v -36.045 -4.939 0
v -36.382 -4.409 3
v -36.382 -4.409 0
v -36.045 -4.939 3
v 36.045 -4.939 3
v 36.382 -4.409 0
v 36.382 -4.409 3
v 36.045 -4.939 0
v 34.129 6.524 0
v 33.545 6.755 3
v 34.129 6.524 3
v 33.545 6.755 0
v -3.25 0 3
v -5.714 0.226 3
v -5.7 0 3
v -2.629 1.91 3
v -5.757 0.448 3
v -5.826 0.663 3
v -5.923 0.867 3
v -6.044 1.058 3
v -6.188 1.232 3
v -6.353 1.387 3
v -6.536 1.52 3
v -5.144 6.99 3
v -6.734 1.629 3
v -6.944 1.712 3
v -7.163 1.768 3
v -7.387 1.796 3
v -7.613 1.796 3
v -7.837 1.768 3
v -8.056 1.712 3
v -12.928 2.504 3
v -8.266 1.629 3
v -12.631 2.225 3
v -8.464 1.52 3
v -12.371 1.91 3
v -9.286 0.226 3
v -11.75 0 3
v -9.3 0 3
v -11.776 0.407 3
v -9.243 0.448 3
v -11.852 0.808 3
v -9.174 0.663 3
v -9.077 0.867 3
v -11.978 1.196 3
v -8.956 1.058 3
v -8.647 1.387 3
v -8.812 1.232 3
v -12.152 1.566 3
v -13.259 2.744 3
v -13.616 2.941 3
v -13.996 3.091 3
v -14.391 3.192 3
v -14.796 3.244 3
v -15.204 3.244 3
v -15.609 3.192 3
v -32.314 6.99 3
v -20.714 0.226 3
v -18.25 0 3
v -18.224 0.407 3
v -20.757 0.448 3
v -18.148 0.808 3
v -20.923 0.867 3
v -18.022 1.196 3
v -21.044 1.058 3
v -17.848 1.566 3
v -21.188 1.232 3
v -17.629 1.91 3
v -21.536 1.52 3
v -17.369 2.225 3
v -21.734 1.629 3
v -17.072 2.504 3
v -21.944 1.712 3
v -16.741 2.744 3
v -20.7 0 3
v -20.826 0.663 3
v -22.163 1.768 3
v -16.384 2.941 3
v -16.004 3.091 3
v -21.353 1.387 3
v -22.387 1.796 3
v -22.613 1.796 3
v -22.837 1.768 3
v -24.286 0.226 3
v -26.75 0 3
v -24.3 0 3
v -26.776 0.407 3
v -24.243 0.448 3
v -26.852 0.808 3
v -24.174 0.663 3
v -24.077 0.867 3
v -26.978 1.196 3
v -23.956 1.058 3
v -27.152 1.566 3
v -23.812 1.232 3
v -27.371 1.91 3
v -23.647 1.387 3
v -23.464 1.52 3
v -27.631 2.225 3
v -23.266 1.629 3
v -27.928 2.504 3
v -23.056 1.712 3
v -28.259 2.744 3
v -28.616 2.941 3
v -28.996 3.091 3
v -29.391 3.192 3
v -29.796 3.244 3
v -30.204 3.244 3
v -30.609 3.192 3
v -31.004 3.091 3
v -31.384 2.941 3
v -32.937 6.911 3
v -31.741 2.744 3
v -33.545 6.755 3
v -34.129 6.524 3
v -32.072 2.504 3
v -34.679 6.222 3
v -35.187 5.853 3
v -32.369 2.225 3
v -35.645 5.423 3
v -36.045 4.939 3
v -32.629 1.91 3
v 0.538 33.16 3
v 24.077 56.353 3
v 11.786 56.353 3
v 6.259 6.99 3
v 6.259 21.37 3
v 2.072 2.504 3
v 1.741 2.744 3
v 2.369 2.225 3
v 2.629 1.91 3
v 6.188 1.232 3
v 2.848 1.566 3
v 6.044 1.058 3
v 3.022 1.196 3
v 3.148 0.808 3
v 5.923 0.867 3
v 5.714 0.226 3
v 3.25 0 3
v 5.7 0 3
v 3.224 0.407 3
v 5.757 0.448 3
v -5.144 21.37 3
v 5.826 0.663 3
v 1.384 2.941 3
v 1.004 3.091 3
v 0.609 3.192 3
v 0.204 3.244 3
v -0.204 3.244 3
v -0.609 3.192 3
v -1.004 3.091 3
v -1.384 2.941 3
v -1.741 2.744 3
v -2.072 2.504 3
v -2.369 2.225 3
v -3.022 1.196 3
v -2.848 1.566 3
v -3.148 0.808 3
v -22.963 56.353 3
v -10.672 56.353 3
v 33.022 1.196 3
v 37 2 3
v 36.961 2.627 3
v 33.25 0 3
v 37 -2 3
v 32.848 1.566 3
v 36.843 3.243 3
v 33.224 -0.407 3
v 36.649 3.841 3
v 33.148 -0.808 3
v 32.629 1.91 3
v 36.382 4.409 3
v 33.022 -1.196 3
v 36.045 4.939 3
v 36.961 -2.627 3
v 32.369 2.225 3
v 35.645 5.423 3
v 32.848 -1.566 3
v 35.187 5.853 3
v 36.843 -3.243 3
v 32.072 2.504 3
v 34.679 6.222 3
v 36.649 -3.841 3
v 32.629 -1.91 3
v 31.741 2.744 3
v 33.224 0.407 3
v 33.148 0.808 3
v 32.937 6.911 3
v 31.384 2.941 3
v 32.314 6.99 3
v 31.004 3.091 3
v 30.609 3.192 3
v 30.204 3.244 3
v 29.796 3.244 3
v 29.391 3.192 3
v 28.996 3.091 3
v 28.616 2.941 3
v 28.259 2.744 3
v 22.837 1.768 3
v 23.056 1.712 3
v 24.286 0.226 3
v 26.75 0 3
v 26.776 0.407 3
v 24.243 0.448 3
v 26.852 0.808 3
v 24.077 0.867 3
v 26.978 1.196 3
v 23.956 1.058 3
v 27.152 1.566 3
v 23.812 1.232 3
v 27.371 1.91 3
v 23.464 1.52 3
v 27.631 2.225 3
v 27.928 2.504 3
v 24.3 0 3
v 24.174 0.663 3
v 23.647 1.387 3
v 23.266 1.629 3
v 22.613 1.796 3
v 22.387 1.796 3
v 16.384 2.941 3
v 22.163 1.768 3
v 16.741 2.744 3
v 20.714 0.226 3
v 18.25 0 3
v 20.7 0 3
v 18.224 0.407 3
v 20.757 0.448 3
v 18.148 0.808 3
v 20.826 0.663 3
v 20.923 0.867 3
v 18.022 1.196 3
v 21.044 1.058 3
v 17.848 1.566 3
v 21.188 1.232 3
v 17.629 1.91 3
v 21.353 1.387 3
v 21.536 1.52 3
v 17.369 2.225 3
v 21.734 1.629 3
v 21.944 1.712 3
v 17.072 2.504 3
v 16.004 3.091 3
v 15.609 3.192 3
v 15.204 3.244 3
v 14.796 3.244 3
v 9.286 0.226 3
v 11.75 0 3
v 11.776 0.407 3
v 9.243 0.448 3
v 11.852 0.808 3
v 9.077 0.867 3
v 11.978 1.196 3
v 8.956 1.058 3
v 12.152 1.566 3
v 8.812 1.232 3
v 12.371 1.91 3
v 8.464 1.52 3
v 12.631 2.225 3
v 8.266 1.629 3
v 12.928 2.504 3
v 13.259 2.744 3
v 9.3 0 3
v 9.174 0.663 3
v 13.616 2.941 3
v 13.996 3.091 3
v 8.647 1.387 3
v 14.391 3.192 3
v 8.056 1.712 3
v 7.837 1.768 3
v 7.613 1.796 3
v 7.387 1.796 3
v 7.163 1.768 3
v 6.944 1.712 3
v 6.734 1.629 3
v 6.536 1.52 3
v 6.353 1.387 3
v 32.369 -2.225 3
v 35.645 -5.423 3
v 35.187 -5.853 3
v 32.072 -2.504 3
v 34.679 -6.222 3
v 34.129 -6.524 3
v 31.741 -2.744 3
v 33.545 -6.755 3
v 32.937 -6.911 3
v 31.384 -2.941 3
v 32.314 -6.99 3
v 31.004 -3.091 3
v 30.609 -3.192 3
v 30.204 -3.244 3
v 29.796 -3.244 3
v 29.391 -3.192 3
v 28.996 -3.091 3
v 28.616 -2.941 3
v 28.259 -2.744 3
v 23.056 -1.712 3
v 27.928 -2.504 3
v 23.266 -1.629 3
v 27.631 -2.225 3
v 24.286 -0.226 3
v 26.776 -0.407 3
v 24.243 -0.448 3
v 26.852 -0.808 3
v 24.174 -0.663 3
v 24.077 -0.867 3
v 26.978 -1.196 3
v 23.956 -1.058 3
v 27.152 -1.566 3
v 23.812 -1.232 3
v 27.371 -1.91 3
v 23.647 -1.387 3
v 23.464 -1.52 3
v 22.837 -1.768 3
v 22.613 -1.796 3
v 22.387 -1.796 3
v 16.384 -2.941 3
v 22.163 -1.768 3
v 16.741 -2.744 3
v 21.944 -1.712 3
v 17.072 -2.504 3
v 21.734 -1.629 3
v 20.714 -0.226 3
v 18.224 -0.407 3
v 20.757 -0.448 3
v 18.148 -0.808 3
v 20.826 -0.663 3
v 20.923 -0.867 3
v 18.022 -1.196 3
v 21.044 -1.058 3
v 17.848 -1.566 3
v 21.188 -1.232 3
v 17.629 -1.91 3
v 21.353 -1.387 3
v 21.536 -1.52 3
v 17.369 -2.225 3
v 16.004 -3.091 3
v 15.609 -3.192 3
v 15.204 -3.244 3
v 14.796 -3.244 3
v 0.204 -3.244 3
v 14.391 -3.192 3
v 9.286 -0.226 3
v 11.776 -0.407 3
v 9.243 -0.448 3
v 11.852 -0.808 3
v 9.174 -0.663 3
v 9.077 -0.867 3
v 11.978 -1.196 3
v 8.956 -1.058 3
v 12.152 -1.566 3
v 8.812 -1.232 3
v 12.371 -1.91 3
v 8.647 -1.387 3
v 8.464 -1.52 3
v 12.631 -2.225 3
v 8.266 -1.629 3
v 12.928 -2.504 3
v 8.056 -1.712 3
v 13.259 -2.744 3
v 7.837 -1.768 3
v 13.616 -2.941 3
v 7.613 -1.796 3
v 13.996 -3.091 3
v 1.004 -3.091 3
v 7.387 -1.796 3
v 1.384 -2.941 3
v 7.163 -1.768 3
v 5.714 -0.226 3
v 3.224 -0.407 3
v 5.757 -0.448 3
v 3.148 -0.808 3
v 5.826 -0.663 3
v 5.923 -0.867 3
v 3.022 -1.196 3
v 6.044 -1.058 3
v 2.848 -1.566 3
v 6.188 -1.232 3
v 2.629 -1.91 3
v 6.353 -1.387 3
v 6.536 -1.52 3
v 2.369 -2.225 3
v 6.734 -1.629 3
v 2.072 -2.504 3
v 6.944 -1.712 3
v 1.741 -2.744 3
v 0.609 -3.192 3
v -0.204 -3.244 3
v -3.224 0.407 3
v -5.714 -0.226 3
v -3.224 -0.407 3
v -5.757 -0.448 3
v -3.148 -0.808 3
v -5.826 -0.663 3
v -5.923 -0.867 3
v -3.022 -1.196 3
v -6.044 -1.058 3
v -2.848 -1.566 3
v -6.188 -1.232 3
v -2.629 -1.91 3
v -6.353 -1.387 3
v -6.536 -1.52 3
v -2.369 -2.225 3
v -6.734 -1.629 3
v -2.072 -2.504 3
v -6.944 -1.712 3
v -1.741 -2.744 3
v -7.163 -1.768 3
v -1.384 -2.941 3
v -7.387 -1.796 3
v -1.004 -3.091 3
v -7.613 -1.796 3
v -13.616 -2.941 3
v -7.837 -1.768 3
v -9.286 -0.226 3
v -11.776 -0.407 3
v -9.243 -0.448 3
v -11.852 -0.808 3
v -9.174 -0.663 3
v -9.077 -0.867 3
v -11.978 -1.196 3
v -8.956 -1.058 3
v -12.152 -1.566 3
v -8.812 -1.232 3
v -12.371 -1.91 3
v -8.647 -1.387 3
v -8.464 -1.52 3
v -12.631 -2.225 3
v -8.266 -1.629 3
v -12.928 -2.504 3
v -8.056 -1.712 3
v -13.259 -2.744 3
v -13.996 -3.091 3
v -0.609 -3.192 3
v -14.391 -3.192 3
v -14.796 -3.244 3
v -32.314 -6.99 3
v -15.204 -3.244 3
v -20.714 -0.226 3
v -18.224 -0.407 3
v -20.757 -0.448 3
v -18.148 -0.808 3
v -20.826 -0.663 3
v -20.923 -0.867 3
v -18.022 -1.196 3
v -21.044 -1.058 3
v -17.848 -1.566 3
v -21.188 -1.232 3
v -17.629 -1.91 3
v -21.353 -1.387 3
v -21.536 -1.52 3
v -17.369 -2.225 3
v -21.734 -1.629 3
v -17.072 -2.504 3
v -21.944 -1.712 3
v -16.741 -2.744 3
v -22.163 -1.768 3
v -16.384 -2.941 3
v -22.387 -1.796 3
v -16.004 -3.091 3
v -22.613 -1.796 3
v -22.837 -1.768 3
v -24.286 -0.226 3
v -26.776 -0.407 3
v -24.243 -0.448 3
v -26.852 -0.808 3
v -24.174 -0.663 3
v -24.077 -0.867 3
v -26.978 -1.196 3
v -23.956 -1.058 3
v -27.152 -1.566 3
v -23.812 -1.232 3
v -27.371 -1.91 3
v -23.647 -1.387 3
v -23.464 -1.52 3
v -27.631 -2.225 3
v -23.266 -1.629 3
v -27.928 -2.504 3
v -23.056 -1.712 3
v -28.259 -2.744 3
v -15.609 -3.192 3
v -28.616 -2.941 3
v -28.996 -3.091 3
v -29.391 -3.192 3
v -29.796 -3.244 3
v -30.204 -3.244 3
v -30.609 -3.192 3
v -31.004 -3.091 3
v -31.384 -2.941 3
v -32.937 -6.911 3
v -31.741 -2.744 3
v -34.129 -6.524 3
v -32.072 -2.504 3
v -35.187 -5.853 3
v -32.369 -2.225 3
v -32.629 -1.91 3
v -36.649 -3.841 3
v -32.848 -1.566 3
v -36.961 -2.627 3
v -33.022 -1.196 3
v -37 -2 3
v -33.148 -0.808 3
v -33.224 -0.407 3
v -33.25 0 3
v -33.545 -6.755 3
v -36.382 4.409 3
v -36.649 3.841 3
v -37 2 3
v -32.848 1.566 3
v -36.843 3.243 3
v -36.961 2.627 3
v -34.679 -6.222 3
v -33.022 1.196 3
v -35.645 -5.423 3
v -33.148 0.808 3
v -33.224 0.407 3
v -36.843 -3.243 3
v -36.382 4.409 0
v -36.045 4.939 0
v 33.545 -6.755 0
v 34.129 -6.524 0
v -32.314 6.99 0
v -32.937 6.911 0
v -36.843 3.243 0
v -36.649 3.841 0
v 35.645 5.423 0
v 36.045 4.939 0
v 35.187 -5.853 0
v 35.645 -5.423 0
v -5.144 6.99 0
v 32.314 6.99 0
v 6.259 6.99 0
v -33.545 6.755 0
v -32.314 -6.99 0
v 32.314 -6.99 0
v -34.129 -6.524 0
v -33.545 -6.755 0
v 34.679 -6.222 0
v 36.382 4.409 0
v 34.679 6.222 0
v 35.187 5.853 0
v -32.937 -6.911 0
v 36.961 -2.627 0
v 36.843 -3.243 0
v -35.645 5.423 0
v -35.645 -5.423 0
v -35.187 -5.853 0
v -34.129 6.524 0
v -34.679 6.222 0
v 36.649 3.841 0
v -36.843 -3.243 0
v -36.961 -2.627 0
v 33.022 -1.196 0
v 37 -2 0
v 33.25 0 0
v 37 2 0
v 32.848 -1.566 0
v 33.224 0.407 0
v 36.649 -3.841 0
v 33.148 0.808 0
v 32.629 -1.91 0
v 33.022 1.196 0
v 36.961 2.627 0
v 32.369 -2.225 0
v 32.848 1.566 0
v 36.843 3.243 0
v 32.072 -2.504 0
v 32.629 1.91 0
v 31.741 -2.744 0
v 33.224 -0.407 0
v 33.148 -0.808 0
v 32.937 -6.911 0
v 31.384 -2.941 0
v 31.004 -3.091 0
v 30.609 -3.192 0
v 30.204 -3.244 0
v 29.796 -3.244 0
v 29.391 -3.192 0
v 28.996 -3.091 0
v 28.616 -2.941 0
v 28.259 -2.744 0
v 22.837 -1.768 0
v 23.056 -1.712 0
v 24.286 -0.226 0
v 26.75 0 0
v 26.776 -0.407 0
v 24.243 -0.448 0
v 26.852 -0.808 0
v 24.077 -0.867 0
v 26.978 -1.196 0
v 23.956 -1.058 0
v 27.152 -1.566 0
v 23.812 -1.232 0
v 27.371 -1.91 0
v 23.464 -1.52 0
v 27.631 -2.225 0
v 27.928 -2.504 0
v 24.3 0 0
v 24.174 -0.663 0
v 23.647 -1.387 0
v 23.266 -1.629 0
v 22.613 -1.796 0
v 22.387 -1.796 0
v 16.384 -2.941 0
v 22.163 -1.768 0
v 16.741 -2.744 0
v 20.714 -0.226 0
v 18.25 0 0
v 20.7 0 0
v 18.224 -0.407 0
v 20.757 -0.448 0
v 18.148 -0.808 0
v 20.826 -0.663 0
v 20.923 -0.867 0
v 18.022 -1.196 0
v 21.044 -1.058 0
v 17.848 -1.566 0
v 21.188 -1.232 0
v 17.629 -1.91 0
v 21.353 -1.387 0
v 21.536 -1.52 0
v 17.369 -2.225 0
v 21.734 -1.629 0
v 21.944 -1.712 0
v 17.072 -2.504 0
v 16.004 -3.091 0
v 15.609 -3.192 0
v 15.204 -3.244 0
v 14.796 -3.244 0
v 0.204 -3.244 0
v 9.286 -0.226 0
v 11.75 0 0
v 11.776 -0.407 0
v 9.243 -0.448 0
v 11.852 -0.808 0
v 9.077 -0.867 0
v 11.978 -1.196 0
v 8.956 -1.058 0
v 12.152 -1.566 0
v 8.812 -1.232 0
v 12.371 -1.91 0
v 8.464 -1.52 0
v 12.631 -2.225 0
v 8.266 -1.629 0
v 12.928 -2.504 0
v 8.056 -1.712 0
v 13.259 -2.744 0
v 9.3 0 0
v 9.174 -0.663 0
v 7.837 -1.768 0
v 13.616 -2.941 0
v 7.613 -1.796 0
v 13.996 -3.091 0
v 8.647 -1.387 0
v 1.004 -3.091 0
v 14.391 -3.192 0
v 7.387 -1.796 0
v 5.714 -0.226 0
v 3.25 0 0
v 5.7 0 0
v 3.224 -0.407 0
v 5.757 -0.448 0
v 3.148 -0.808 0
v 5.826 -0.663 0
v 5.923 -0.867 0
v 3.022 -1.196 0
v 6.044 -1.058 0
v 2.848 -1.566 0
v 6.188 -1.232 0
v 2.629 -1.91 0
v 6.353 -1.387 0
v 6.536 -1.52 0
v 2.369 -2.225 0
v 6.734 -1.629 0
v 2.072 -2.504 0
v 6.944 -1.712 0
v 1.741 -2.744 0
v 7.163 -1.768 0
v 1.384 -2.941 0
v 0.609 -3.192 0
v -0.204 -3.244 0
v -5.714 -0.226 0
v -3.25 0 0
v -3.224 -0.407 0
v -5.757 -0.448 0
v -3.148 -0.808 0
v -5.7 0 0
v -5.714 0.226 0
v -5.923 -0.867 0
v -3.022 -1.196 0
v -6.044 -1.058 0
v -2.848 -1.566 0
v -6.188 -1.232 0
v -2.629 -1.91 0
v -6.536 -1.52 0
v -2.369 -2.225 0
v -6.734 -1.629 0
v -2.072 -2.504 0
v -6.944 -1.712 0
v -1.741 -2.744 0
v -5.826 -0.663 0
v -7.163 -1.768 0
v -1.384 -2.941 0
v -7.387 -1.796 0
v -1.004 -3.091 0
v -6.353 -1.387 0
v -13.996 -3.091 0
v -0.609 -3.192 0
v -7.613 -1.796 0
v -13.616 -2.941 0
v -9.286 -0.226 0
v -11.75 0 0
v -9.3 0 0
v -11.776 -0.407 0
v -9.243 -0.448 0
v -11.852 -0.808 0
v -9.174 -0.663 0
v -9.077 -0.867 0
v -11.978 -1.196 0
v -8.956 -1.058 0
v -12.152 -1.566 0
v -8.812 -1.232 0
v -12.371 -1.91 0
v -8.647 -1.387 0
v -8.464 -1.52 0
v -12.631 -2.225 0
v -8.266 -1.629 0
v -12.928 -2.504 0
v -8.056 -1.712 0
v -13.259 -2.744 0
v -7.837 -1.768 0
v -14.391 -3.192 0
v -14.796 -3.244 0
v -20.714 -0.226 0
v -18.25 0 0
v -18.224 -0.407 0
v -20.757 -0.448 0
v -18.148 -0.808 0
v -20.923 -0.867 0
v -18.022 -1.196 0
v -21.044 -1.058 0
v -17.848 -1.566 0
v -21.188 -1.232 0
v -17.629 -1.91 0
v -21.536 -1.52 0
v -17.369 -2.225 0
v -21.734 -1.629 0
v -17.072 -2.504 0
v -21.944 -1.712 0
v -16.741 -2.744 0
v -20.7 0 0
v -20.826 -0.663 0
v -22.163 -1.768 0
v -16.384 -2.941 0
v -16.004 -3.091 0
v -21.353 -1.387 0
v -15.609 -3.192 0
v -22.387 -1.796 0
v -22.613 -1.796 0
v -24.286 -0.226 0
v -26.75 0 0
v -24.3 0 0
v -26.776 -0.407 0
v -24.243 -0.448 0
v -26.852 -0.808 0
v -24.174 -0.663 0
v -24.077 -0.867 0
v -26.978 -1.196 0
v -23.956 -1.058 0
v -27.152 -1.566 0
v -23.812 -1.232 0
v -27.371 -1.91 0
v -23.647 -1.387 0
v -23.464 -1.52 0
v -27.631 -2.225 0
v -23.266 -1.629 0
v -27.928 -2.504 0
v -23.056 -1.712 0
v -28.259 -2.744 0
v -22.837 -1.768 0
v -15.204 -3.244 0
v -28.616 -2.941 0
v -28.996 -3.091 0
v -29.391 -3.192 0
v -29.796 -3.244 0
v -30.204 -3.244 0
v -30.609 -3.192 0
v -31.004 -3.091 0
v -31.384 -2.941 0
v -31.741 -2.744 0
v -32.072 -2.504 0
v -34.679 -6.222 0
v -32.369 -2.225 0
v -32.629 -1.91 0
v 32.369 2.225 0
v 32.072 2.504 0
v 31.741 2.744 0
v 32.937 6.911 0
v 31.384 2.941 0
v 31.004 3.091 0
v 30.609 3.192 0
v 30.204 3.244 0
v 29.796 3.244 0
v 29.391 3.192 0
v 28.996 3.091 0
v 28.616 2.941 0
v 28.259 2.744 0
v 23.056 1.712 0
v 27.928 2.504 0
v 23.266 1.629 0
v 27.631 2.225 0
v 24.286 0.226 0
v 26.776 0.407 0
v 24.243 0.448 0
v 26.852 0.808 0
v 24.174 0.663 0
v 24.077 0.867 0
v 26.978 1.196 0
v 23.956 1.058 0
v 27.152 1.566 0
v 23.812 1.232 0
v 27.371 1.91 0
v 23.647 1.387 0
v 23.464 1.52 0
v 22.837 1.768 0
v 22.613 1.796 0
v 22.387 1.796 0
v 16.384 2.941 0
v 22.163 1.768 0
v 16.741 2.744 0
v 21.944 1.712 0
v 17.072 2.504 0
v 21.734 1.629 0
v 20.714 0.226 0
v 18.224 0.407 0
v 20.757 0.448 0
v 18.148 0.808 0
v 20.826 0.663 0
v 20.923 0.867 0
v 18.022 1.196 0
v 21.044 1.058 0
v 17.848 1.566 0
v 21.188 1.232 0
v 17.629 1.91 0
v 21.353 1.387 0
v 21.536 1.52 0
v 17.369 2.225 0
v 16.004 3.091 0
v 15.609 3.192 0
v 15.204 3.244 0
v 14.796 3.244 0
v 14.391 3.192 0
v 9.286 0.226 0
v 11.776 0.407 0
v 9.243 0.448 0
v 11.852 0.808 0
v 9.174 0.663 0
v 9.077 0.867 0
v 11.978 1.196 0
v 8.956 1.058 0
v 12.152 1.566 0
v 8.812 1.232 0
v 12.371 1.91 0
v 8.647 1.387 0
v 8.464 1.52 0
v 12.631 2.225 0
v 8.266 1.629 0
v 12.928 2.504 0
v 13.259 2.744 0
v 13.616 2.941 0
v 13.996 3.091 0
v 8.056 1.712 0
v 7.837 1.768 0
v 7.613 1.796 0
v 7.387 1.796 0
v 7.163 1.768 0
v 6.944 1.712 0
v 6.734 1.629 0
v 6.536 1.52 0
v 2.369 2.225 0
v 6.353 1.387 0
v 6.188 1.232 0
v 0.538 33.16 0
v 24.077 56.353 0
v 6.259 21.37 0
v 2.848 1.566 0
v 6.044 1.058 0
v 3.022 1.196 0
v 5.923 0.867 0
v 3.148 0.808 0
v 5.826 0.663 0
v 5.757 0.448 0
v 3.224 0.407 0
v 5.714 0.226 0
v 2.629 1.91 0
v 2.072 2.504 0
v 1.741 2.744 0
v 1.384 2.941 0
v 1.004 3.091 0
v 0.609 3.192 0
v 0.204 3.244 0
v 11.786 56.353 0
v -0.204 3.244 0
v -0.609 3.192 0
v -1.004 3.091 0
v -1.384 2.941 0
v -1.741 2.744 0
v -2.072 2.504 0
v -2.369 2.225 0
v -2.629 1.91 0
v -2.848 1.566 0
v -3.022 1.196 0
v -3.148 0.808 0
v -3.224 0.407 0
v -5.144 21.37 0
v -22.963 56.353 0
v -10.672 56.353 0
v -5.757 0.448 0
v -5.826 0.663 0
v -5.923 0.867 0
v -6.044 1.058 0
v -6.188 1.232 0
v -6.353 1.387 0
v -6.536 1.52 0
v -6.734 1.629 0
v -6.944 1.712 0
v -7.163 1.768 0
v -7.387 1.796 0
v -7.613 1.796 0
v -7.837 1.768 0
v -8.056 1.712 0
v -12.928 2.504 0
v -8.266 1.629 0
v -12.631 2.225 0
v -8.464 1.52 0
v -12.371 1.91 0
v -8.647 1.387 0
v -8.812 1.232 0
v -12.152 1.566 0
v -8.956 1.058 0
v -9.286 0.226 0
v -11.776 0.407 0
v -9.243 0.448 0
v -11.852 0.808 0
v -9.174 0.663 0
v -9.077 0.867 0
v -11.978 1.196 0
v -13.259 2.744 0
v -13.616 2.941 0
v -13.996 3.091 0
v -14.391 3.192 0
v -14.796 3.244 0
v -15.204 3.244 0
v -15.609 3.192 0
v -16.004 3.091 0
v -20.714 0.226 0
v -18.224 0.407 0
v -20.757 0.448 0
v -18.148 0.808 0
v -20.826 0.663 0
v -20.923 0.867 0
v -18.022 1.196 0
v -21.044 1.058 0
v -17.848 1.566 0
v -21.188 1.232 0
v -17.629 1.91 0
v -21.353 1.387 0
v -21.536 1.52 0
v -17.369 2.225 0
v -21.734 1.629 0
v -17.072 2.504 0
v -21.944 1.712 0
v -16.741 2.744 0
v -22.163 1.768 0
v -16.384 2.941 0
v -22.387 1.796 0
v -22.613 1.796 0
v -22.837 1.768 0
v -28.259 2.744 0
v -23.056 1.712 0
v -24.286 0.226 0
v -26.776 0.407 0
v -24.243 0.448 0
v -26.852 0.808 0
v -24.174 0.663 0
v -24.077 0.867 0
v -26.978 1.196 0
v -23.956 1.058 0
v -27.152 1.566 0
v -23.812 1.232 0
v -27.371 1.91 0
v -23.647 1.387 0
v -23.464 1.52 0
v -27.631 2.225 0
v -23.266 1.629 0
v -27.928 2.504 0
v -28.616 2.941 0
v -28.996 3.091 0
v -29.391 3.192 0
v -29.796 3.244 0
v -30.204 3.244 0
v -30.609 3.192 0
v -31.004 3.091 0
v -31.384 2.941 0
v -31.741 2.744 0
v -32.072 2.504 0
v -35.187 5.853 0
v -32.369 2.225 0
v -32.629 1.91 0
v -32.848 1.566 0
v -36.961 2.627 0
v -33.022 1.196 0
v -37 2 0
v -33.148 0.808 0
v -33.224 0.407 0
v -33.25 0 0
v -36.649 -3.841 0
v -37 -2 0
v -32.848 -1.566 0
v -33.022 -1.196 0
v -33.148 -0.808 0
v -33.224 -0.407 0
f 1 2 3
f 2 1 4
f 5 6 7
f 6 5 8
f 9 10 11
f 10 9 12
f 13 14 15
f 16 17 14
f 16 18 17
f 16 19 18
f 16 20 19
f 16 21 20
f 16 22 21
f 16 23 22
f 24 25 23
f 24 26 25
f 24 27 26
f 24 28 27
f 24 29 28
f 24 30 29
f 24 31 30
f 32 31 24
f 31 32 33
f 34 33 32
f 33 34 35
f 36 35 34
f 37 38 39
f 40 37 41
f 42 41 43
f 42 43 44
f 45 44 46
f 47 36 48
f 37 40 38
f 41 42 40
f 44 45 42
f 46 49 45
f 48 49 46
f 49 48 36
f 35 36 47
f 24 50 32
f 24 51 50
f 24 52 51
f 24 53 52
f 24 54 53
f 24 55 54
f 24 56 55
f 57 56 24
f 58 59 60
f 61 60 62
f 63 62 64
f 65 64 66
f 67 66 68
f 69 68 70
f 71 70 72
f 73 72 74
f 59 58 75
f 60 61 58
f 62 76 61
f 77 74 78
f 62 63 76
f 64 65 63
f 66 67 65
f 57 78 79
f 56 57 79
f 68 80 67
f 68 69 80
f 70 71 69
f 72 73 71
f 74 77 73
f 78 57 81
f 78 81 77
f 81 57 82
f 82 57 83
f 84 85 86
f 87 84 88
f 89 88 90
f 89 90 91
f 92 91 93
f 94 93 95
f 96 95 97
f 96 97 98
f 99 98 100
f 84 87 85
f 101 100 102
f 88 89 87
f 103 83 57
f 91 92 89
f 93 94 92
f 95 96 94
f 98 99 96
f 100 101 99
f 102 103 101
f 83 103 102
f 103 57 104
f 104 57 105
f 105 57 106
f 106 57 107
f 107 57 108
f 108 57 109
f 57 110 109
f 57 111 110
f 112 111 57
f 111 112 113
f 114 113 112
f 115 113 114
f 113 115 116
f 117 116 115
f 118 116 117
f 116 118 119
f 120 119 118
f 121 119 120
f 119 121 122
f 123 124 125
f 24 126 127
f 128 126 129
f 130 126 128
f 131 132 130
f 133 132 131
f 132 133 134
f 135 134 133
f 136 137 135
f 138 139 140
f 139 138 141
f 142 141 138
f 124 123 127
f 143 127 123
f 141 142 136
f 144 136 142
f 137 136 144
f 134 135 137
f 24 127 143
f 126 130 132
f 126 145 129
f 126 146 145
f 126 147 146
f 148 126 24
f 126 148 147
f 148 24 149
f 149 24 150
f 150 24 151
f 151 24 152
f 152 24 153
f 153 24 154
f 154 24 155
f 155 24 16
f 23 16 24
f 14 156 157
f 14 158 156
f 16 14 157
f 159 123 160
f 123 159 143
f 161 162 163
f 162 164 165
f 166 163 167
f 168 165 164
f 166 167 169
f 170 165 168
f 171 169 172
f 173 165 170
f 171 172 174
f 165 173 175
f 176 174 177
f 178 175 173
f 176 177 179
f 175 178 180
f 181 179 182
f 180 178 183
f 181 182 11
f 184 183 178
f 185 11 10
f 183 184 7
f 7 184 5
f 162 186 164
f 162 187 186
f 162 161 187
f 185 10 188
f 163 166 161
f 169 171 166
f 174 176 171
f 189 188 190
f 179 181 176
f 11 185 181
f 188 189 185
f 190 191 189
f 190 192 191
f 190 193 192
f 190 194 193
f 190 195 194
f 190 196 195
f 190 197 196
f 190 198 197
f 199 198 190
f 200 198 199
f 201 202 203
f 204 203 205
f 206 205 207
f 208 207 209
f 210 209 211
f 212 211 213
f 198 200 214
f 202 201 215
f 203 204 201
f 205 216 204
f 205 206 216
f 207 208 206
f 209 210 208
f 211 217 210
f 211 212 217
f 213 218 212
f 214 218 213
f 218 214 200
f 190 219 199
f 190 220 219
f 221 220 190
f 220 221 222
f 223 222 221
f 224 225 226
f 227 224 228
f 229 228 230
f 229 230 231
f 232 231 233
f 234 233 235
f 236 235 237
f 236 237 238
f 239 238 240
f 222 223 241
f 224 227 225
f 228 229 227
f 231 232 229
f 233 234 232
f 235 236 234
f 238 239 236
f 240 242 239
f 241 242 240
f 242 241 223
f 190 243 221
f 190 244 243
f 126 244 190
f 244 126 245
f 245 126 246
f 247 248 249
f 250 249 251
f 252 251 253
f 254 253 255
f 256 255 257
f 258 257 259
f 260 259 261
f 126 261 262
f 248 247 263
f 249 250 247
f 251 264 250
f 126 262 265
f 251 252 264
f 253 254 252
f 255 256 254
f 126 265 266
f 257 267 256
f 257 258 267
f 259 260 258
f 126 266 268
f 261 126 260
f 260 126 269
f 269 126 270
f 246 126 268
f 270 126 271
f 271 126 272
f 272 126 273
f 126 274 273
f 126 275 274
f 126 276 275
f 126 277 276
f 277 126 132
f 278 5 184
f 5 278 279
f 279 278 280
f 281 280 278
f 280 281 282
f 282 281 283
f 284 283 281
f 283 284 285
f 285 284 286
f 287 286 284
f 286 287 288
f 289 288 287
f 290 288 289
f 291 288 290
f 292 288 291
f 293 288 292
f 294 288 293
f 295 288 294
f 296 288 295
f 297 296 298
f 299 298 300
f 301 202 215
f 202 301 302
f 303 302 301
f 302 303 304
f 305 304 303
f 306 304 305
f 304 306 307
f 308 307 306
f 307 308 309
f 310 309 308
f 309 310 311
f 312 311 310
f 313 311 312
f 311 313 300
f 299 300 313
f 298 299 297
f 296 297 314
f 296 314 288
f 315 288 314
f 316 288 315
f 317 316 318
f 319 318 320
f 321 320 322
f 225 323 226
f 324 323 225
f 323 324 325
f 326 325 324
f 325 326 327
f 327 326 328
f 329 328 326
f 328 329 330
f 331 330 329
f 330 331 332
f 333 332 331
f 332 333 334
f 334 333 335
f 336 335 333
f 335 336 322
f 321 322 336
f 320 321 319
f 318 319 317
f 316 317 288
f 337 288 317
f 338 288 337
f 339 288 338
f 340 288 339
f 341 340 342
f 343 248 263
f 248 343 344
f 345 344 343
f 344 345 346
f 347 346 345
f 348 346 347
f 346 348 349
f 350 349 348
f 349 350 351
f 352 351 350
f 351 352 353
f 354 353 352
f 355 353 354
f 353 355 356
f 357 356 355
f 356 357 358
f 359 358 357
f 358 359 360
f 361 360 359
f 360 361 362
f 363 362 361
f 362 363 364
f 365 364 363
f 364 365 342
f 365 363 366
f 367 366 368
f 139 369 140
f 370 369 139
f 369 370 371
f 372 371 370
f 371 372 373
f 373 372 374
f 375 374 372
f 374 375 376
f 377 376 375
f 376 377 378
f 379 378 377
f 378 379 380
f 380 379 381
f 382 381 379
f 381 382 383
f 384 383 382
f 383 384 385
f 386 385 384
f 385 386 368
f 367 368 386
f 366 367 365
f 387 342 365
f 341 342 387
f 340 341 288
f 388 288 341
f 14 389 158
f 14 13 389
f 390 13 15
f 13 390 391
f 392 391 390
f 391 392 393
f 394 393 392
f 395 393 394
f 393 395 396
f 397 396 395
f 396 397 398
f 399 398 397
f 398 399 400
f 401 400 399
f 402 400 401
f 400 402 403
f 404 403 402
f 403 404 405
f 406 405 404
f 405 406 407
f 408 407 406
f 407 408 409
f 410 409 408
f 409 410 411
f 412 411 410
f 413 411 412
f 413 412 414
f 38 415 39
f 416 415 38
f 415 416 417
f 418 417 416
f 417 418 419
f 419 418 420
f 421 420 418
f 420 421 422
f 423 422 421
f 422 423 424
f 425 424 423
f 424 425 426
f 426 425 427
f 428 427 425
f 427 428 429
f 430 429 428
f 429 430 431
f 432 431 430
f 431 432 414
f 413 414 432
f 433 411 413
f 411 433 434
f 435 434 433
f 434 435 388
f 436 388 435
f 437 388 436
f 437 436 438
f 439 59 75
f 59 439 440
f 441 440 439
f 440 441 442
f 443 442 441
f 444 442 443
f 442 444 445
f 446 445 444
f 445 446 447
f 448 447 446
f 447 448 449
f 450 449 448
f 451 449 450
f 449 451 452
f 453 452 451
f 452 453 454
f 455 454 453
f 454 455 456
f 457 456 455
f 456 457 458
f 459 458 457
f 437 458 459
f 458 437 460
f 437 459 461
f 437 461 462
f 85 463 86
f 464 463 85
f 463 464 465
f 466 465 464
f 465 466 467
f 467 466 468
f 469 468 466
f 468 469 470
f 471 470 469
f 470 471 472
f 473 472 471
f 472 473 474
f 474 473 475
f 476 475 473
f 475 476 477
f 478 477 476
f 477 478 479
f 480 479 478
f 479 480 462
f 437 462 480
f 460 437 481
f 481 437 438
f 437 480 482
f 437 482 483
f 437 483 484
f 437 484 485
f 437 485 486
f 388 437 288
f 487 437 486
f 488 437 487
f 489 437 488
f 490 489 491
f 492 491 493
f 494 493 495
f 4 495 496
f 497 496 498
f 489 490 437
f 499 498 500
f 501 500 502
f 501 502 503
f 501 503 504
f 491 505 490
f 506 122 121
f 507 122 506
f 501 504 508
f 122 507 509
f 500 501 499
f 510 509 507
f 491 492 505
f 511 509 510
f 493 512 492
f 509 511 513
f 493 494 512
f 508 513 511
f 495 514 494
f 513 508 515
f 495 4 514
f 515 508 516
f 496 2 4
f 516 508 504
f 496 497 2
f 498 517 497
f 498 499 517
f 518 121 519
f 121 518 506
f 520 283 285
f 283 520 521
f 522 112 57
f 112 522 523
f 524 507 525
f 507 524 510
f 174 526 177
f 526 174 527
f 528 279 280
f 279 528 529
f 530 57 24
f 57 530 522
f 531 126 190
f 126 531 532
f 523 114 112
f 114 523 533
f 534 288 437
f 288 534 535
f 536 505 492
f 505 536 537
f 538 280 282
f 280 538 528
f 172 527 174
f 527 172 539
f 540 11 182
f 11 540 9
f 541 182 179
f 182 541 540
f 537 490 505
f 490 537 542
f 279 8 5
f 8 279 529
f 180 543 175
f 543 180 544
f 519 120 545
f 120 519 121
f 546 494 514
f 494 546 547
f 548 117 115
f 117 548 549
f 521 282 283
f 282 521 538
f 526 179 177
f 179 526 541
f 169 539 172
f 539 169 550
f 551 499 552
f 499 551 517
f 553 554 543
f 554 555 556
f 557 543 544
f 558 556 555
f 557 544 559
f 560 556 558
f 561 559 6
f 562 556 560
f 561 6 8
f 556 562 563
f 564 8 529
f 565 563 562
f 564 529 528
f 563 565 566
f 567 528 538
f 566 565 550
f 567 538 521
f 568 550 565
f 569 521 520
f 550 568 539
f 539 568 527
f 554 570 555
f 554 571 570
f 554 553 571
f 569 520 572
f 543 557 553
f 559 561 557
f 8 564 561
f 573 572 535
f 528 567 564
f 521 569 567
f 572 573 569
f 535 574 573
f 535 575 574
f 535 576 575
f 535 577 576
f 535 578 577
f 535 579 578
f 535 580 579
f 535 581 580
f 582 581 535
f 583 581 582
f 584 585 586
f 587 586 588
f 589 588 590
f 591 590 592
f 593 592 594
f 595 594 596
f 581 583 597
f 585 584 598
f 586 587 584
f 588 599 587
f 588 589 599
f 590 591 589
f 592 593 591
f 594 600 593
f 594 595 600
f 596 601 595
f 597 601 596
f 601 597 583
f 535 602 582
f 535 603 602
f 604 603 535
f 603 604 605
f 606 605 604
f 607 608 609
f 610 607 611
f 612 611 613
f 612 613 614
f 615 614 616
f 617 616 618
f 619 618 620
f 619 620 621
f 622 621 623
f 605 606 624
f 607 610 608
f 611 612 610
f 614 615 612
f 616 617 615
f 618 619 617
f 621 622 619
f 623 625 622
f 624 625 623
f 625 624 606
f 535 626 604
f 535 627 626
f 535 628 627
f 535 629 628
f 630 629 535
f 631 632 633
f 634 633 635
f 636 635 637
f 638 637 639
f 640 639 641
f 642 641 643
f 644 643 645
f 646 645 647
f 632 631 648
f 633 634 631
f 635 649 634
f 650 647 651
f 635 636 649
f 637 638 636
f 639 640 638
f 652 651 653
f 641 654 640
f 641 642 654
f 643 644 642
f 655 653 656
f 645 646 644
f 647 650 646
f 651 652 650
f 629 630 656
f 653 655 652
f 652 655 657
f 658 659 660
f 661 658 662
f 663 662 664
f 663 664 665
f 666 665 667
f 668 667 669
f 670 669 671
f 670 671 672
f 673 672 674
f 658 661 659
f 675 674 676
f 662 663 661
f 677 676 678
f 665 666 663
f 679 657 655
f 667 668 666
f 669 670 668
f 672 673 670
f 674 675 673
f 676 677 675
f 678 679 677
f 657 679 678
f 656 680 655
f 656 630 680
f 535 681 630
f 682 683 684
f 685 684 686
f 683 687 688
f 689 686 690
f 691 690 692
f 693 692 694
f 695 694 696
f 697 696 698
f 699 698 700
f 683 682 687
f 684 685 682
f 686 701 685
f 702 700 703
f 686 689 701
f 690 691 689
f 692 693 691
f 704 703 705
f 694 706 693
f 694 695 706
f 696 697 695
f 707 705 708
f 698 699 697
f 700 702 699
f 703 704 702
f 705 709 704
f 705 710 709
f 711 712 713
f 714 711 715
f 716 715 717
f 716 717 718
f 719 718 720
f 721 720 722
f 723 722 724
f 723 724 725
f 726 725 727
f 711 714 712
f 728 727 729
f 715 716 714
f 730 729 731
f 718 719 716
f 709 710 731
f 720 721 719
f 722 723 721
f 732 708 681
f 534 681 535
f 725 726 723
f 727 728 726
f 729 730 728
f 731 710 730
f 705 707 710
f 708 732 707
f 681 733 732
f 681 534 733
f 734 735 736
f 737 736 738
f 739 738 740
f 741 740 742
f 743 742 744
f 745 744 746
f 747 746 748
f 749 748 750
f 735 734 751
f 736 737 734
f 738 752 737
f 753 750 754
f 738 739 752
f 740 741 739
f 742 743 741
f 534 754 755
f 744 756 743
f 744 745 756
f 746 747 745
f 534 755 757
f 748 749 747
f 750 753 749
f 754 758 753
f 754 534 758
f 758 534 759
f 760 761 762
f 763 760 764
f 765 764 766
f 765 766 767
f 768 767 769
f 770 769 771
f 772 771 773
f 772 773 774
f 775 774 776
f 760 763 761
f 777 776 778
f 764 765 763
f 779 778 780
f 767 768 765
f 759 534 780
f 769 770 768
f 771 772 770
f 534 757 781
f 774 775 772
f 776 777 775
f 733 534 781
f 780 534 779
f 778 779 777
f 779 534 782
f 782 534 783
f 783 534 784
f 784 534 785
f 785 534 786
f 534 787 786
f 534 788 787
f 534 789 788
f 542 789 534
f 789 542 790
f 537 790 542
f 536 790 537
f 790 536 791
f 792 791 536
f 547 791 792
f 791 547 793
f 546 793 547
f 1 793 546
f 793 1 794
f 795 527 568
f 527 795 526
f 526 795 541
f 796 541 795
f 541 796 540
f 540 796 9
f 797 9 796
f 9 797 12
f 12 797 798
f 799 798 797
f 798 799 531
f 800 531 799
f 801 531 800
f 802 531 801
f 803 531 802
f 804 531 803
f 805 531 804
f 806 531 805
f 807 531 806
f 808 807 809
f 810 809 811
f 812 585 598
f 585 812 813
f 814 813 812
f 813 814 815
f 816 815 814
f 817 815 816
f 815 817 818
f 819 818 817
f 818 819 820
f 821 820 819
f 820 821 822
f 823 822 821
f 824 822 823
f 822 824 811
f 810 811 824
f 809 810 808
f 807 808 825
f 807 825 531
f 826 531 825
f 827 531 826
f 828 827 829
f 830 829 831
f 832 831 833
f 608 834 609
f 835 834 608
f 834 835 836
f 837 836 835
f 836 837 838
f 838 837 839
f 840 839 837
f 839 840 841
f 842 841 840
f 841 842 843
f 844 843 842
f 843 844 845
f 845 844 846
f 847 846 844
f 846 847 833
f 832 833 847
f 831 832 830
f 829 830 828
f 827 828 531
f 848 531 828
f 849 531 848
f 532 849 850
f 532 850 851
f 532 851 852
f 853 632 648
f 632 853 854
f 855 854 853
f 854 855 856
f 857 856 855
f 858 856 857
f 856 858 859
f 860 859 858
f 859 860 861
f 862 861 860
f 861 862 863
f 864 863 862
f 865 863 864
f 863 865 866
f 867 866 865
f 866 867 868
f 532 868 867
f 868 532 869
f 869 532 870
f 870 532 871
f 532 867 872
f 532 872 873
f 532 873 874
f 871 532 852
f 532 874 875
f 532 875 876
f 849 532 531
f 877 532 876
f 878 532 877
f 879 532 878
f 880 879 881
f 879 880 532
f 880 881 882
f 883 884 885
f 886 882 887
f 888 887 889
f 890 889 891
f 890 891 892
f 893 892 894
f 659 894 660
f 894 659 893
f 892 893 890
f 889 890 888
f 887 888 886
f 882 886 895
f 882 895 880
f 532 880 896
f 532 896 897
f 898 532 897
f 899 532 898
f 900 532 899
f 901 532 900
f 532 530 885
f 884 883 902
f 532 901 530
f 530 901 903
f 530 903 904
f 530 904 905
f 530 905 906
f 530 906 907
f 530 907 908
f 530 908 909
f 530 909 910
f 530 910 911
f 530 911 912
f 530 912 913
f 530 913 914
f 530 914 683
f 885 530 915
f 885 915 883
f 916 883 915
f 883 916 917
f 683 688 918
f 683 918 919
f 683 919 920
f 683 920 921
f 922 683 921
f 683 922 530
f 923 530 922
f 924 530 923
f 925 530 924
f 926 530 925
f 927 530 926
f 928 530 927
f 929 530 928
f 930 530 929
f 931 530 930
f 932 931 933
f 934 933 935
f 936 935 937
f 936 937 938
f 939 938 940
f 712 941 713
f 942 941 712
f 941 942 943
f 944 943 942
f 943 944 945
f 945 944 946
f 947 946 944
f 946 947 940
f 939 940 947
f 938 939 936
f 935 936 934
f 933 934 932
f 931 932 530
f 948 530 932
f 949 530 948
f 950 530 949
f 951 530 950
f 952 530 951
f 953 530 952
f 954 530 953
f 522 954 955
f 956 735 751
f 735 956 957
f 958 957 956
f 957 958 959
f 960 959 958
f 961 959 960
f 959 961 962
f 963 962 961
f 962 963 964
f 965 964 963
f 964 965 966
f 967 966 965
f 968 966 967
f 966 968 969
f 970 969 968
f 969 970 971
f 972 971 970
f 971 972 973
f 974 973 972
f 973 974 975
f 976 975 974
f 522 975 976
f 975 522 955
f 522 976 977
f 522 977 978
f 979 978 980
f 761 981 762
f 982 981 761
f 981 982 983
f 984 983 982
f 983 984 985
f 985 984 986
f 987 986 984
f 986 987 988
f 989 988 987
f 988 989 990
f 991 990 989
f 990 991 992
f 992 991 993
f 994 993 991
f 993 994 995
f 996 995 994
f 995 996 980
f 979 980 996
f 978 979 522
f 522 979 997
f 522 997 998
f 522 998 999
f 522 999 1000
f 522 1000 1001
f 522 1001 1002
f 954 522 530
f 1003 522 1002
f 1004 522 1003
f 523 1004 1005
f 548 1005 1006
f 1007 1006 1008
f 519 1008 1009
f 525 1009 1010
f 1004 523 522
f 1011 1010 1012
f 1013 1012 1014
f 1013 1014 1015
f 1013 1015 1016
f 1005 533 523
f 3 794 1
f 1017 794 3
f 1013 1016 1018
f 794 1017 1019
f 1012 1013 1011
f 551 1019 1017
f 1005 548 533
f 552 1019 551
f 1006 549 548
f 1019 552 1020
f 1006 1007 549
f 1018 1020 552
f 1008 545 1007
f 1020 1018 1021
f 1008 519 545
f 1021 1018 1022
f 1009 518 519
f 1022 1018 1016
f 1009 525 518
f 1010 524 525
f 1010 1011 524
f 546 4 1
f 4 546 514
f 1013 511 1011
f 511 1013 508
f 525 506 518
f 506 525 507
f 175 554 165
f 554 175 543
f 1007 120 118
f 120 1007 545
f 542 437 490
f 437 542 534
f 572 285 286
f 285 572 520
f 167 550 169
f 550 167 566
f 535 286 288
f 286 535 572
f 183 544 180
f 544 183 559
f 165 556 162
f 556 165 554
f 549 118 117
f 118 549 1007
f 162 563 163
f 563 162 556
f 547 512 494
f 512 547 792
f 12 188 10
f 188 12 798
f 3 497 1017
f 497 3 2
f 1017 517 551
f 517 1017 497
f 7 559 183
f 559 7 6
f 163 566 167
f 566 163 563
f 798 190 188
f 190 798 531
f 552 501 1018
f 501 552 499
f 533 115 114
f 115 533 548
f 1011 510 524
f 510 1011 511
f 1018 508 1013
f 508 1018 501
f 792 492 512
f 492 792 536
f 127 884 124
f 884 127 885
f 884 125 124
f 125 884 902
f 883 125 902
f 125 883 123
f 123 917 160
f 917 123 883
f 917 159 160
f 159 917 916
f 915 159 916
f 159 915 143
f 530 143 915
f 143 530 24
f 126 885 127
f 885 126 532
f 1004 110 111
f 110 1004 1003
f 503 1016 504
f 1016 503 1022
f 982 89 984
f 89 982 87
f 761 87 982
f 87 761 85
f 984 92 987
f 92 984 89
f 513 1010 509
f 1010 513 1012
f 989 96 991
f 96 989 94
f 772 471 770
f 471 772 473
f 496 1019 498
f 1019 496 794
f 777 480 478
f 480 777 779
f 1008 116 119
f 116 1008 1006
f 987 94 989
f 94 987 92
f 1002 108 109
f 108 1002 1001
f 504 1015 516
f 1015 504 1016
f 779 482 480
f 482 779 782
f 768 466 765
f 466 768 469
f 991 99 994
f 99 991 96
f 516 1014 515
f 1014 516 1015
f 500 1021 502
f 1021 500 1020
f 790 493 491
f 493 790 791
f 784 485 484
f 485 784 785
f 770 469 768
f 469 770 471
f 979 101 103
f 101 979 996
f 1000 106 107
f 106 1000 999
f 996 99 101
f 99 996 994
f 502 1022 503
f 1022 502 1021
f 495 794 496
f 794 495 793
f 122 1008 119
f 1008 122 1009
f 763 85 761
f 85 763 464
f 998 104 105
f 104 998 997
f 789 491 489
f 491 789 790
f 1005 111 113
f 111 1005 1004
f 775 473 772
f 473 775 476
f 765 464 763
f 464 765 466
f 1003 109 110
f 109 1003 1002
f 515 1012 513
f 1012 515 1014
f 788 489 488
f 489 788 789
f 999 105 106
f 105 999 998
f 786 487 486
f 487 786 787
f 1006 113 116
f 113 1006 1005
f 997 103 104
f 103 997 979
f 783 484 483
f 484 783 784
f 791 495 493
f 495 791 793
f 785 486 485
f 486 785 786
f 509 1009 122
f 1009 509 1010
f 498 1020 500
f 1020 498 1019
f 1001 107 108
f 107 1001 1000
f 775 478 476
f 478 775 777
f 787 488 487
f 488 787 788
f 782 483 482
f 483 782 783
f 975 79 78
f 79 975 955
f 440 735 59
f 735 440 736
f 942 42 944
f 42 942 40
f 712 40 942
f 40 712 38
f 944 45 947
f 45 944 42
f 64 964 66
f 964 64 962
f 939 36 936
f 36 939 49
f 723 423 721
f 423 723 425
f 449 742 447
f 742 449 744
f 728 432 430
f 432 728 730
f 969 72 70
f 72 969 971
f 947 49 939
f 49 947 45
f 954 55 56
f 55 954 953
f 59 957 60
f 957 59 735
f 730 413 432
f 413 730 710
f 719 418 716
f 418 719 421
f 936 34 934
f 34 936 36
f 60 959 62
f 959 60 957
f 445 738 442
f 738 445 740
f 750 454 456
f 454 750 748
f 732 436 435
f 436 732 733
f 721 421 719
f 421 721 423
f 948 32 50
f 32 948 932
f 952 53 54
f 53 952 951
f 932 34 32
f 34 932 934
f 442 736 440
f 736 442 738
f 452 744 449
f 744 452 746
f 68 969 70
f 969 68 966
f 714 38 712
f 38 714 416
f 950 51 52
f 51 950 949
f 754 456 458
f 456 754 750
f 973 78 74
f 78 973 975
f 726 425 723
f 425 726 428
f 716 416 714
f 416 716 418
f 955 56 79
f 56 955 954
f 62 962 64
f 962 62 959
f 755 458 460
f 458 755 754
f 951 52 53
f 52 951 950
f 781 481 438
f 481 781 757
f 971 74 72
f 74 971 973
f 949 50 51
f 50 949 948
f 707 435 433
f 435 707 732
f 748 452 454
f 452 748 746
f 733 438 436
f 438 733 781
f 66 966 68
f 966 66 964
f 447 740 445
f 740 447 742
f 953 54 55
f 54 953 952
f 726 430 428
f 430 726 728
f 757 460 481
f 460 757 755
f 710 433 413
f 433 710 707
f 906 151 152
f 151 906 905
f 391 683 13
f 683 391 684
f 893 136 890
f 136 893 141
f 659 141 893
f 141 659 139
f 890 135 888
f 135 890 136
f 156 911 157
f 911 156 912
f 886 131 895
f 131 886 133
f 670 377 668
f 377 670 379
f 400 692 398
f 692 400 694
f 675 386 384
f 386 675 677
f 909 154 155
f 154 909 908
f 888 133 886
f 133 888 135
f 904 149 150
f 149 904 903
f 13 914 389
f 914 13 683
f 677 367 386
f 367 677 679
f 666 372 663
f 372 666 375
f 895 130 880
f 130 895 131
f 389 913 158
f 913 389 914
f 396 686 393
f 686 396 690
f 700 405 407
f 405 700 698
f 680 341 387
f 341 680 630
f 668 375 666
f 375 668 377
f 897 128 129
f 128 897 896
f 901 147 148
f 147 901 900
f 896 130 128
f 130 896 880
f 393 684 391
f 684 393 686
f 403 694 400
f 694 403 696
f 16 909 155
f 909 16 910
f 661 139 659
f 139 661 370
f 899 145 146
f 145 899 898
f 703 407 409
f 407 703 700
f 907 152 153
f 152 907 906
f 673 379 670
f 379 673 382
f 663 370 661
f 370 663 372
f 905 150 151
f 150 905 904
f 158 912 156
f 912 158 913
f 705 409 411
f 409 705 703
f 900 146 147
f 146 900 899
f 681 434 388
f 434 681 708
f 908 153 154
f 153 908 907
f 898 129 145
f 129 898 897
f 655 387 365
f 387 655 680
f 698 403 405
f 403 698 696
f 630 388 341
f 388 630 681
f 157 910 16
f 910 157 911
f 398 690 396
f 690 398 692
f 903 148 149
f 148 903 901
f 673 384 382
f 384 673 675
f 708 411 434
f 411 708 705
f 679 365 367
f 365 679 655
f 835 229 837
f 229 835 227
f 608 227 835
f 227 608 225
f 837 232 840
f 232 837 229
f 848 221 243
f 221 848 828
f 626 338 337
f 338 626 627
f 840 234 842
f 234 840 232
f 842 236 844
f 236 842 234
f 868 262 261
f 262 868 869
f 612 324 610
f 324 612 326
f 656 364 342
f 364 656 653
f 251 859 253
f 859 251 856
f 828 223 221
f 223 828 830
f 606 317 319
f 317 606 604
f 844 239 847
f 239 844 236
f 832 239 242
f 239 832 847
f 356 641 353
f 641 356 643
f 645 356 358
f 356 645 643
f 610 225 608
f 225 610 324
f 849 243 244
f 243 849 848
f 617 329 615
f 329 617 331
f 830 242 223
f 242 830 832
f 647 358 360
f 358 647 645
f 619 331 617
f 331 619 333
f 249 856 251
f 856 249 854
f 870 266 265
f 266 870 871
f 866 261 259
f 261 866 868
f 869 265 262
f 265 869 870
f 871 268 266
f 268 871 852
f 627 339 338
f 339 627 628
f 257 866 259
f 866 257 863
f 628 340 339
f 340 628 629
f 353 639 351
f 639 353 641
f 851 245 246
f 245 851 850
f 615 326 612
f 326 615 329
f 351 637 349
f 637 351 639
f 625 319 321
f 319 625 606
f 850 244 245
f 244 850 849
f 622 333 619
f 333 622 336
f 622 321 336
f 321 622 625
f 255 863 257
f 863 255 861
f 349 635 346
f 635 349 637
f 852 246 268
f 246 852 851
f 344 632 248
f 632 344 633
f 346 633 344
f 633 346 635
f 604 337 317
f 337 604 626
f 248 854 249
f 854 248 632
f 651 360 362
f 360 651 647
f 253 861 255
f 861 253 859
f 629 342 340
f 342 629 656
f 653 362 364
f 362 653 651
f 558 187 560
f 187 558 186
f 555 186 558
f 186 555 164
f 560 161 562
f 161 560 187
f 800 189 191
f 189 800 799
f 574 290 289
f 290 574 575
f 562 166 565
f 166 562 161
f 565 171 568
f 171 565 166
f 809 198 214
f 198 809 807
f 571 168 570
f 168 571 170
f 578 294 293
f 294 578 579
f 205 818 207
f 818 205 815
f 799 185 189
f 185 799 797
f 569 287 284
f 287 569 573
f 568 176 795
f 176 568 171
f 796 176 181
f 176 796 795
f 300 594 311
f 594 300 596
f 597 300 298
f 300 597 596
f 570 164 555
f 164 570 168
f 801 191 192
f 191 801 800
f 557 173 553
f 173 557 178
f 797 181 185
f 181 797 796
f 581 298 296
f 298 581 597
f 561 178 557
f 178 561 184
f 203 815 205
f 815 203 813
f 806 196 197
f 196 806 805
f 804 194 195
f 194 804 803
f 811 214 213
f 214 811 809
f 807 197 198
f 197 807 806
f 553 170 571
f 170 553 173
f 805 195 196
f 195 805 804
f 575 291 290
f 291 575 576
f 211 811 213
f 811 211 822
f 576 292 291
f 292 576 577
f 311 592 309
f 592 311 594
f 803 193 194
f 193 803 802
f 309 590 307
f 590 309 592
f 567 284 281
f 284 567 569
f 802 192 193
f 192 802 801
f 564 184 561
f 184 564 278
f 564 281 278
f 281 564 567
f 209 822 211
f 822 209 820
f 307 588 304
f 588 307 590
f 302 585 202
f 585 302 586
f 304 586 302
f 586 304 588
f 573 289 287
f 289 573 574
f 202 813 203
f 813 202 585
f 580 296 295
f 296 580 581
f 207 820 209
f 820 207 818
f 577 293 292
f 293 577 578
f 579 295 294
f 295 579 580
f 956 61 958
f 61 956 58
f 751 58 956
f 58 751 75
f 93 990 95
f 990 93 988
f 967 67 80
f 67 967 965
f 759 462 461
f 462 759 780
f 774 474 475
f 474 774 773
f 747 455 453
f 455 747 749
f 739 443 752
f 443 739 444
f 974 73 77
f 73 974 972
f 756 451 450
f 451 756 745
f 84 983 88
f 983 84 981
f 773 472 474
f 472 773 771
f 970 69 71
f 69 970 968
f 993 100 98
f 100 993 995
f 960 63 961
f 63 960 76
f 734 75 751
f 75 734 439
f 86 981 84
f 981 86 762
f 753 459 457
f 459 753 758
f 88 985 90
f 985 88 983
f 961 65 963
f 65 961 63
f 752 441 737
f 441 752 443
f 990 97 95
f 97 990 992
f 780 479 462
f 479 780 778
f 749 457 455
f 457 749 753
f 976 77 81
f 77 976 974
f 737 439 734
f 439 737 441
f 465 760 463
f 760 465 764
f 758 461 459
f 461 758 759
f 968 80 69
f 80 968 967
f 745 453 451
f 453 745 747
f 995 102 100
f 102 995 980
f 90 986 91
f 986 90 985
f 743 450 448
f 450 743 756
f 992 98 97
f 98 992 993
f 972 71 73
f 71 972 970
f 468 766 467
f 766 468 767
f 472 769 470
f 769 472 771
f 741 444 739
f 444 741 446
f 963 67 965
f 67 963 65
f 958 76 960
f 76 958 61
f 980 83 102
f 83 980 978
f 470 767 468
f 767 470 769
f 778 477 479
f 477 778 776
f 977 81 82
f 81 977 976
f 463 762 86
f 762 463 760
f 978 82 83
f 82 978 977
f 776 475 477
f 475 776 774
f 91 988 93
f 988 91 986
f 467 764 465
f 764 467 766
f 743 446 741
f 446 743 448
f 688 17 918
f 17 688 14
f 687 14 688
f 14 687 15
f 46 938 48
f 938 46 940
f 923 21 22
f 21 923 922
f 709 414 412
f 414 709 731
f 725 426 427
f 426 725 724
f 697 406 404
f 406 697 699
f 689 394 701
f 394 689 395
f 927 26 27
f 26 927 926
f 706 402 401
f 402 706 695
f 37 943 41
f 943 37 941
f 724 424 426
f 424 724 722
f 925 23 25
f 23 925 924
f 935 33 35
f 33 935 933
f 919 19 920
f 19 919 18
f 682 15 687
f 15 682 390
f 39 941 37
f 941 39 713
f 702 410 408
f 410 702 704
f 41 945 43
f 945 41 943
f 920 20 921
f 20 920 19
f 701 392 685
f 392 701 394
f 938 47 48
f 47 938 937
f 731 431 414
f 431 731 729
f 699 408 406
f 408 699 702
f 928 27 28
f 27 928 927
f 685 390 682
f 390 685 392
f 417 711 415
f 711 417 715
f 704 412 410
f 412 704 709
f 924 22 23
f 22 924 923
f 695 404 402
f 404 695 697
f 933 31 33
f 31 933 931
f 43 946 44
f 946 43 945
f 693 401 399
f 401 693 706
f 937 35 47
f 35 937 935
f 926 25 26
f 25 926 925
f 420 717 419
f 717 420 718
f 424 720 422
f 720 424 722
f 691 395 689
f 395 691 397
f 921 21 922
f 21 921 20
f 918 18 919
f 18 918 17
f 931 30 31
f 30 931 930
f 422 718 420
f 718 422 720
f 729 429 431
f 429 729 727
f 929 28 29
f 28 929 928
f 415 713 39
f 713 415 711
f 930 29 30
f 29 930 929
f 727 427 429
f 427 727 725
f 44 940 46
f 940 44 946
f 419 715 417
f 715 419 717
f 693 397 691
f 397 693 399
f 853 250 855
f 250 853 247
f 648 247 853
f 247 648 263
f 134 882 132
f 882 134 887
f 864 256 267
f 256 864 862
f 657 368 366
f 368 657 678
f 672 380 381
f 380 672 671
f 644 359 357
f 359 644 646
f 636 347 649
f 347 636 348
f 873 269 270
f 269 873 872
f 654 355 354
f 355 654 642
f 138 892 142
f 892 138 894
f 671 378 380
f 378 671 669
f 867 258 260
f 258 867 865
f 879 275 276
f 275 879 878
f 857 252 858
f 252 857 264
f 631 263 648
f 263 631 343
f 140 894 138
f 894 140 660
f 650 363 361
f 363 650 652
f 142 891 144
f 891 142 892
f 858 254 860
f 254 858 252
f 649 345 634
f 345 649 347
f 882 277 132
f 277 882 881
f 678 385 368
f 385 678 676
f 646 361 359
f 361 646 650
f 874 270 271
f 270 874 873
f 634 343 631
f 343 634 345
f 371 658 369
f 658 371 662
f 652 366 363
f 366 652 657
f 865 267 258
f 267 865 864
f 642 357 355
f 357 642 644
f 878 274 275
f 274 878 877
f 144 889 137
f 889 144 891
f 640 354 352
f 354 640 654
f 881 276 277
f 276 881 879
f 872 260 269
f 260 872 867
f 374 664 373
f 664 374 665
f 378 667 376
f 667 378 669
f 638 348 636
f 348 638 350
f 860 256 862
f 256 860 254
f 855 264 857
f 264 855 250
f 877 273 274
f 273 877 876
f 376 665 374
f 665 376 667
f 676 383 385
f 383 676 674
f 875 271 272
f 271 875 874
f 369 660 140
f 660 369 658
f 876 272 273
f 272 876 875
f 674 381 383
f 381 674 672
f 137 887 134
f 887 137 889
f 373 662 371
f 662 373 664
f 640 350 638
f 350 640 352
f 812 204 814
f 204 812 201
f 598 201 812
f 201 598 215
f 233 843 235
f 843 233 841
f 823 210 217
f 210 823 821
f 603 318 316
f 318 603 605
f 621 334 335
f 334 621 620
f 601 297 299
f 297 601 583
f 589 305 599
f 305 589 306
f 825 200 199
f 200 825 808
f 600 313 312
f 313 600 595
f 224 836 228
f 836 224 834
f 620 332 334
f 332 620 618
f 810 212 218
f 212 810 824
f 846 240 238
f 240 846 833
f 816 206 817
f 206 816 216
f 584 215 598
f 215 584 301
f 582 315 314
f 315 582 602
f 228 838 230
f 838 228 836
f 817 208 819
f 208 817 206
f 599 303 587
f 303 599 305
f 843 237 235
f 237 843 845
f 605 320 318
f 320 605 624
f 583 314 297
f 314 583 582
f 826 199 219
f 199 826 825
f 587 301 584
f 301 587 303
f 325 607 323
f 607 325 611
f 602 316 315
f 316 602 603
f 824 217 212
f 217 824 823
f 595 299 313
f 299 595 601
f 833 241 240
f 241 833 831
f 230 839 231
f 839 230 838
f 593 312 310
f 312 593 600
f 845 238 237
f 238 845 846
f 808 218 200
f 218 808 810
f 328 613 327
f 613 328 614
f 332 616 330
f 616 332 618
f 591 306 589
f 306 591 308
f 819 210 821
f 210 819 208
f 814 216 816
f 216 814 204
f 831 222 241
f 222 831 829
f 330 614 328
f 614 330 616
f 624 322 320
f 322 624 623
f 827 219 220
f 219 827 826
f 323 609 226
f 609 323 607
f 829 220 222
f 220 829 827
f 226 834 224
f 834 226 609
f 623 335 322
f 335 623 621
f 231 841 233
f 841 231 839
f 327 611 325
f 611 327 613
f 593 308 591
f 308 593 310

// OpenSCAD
$fn = 50;


difference() {
	union() {
		hull() {
			translate(v = [-32.0000000000, 2.0000000000, 0]) {
				cylinder(h = 3, r = 5);
			}
			translate(v = [32.0000000000, 2.0000000000, 0]) {
				cylinder(h = 3, r = 5);
			}
			translate(v = [-32.0000000000, -2.0000000000, 0]) {
				cylinder(h = 3, r = 5);
			}
			translate(v = [32.0000000000, -2.0000000000, 0]) {
				cylinder(h = 3, r = 5);
			}
		}
		translate(v = [0, 55, 0]) {
			linear_extrude(height = 3) {
				text(font = "DejaVu Sans Mono:style=Bold", halign = "center", size = 57.0000000000, text = "Y", valign = "top");
			}
		}
	}
	union() {
		translate(v = [-30.0000000000, 0.0000000000, 0]) {
			translate(v = [0, 0, -100]) {
				cylinder(h = 200, r = 3.2500000000);
			}
		}
		translate(v = [-15.0000000000, 0.0000000000, 0]) {
			translate(v = [0, 0, -100]) {
				cylinder(h = 200, r = 3.2500000000);
			}
		}
		translate(v = [0, 0, -100]) {
			cylinder(h = 200, r = 3.2500000000);
		}
		translate(v = [15.0000000000, 0.0000000000, 0]) {
			translate(v = [0, 0, -100]) {
				cylinder(h = 200, r = 3.2500000000);
			}
		}
		translate(v = [30.0000000000, 0.0000000000, 0]) {
			translate(v = [0, 0, -100]) {
				cylinder(h = 200, r = 3.2500000000);
			}
		}
		translate(v = [-30.0000000000, 0.0000000000, 0]) {
			translate(v = [0, 0, -100]) {
				cylinder(h = 200, r = 1.8000000000);
			}
		}
		translate(v = [-22.5000000000, 0.0000000000, 0]) {
			translate(v = [0, 0, -100]) {
				cylinder(h = 200, r = 1.8000000000);
			}
		}
		translate(v = [-15.0000000000, 0.0000000000, 0]) {
			translate(v = [0, 0, -100]) {
				cylinder(h = 200, r = 1.8000000000);
			}
		}
		translate(v = [-7.5000000000, 0.0000000000, 0]) {
			translate(v = [0, 0, -100]) {
				cylinder(h = 200, r = 1.8000000000);
			}
		}
		translate(v = [0, 0, -100]) {
			cylinder(h = 200, r = 1.8000000000);
		}
		translate(v = [7.5000000000, 0.0000000000, 0]) {
			translate(v = [0, 0, -100]) {
				cylinder(h = 200, r = 1.8000000000);
			}
		}
		translate(v = [15.0000000000, 0.0000000000, 0]) {
			translate(v = [0, 0, -100]) {
				cylinder(h = 200, r = 1.8000000000);
			}
		}
		translate(v = [22.5000000000, 0.0000000000, 0]) {
			translate(v = [0, 0, -100]) {
				cylinder(h = 200, r = 1.8000000000);
			}
		}
		translate(v = [30.0000000000, 0.0000000000, 0]) {
			translate(v = [0, 0, -100]) {
				cylinder(h = 200, r = 1.8000000000);
			}
		}
	}
}
